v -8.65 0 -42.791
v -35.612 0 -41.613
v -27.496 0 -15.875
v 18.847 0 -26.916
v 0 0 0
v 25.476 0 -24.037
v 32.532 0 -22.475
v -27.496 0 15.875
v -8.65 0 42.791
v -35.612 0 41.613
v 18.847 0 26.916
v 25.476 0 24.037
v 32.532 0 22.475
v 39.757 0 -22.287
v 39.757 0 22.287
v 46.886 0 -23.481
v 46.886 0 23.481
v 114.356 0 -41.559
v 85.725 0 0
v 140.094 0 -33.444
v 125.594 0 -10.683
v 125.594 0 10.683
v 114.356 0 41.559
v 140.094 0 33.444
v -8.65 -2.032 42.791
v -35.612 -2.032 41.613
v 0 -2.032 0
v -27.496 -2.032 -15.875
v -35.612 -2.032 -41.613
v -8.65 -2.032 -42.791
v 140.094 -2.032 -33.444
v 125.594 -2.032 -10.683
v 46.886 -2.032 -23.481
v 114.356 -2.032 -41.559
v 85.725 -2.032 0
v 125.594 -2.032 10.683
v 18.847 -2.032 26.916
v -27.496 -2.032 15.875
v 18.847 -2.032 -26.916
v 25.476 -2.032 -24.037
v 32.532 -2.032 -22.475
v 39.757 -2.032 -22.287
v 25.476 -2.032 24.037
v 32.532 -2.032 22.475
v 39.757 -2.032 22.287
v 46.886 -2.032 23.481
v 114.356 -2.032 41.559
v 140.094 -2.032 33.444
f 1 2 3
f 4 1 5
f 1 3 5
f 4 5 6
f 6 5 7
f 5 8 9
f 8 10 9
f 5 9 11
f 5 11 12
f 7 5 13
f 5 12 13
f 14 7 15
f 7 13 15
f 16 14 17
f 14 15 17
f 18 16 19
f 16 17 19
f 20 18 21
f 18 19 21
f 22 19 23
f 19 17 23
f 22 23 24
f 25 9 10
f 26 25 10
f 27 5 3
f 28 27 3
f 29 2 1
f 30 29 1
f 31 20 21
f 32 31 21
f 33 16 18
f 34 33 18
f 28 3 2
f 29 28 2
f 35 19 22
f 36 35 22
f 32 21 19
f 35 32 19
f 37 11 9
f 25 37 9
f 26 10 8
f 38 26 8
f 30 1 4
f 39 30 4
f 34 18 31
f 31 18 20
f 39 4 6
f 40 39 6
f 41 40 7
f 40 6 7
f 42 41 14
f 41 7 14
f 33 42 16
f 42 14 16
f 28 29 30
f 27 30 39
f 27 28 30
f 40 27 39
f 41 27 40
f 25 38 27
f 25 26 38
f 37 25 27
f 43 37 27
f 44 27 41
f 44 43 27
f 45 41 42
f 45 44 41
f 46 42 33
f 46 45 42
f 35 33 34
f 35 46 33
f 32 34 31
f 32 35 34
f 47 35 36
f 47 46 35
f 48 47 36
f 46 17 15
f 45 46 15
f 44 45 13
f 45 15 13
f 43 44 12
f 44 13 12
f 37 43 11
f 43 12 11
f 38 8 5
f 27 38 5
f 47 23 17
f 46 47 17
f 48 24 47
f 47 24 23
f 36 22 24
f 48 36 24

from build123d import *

# Parameters (mm, degrees)
F1_DEPTH = 2.032


with BuildPart() as f1:
    # F0 (on Front) → F1 (new body)
    with BuildSketch(Plane.XZ):
        with BuildLine():
            Line((-27.496307, 15.875), (0, 0))
            Line((0, 0), (-27.496307, -15.875))
            Line((-27.496307, -15.875), (-35.611604, -41.613436))
            Line((-35.611604, -41.613436), (-8.64979, -42.790614))
            Line((-8.64979, -42.790614), (18.846516, -26.915614))
            ThreePointArc((18.846516, -26.915614), (32.532451, -22.474943), (46.885606, -23.48057))
            Line((46.885606, -23.48057), (114.355525, -41.55908))
            Line((114.355525, -41.55908), (140.093962, -33.443783))
            Line((140.093962, -33.443783), (125.593588, -10.682756))
            Line((125.593588, -10.682756), (85.725, 0))
            Line((85.725, 0), (125.593588, 10.682756))
            Line((125.593588, 10.682756), (140.093962, 33.443783))
            Line((140.093962, 33.443783), (114.355525, 41.55908))
            Line((114.355525, 41.55908), (46.885606, 23.48057))
            ThreePointArc((46.885606, 23.48057), (32.532451, 22.474943), (18.846516, 26.915614))
            Line((18.846516, 26.915614), (-8.64979, 42.790614))
            Line((-8.64979, 42.790614), (-35.611604, 41.613436))
            Line((-35.611604, 41.613436), (-27.496307, 15.875))
        make_face()
    extrude(amount=F1_DEPTH)


solid = f1.part
